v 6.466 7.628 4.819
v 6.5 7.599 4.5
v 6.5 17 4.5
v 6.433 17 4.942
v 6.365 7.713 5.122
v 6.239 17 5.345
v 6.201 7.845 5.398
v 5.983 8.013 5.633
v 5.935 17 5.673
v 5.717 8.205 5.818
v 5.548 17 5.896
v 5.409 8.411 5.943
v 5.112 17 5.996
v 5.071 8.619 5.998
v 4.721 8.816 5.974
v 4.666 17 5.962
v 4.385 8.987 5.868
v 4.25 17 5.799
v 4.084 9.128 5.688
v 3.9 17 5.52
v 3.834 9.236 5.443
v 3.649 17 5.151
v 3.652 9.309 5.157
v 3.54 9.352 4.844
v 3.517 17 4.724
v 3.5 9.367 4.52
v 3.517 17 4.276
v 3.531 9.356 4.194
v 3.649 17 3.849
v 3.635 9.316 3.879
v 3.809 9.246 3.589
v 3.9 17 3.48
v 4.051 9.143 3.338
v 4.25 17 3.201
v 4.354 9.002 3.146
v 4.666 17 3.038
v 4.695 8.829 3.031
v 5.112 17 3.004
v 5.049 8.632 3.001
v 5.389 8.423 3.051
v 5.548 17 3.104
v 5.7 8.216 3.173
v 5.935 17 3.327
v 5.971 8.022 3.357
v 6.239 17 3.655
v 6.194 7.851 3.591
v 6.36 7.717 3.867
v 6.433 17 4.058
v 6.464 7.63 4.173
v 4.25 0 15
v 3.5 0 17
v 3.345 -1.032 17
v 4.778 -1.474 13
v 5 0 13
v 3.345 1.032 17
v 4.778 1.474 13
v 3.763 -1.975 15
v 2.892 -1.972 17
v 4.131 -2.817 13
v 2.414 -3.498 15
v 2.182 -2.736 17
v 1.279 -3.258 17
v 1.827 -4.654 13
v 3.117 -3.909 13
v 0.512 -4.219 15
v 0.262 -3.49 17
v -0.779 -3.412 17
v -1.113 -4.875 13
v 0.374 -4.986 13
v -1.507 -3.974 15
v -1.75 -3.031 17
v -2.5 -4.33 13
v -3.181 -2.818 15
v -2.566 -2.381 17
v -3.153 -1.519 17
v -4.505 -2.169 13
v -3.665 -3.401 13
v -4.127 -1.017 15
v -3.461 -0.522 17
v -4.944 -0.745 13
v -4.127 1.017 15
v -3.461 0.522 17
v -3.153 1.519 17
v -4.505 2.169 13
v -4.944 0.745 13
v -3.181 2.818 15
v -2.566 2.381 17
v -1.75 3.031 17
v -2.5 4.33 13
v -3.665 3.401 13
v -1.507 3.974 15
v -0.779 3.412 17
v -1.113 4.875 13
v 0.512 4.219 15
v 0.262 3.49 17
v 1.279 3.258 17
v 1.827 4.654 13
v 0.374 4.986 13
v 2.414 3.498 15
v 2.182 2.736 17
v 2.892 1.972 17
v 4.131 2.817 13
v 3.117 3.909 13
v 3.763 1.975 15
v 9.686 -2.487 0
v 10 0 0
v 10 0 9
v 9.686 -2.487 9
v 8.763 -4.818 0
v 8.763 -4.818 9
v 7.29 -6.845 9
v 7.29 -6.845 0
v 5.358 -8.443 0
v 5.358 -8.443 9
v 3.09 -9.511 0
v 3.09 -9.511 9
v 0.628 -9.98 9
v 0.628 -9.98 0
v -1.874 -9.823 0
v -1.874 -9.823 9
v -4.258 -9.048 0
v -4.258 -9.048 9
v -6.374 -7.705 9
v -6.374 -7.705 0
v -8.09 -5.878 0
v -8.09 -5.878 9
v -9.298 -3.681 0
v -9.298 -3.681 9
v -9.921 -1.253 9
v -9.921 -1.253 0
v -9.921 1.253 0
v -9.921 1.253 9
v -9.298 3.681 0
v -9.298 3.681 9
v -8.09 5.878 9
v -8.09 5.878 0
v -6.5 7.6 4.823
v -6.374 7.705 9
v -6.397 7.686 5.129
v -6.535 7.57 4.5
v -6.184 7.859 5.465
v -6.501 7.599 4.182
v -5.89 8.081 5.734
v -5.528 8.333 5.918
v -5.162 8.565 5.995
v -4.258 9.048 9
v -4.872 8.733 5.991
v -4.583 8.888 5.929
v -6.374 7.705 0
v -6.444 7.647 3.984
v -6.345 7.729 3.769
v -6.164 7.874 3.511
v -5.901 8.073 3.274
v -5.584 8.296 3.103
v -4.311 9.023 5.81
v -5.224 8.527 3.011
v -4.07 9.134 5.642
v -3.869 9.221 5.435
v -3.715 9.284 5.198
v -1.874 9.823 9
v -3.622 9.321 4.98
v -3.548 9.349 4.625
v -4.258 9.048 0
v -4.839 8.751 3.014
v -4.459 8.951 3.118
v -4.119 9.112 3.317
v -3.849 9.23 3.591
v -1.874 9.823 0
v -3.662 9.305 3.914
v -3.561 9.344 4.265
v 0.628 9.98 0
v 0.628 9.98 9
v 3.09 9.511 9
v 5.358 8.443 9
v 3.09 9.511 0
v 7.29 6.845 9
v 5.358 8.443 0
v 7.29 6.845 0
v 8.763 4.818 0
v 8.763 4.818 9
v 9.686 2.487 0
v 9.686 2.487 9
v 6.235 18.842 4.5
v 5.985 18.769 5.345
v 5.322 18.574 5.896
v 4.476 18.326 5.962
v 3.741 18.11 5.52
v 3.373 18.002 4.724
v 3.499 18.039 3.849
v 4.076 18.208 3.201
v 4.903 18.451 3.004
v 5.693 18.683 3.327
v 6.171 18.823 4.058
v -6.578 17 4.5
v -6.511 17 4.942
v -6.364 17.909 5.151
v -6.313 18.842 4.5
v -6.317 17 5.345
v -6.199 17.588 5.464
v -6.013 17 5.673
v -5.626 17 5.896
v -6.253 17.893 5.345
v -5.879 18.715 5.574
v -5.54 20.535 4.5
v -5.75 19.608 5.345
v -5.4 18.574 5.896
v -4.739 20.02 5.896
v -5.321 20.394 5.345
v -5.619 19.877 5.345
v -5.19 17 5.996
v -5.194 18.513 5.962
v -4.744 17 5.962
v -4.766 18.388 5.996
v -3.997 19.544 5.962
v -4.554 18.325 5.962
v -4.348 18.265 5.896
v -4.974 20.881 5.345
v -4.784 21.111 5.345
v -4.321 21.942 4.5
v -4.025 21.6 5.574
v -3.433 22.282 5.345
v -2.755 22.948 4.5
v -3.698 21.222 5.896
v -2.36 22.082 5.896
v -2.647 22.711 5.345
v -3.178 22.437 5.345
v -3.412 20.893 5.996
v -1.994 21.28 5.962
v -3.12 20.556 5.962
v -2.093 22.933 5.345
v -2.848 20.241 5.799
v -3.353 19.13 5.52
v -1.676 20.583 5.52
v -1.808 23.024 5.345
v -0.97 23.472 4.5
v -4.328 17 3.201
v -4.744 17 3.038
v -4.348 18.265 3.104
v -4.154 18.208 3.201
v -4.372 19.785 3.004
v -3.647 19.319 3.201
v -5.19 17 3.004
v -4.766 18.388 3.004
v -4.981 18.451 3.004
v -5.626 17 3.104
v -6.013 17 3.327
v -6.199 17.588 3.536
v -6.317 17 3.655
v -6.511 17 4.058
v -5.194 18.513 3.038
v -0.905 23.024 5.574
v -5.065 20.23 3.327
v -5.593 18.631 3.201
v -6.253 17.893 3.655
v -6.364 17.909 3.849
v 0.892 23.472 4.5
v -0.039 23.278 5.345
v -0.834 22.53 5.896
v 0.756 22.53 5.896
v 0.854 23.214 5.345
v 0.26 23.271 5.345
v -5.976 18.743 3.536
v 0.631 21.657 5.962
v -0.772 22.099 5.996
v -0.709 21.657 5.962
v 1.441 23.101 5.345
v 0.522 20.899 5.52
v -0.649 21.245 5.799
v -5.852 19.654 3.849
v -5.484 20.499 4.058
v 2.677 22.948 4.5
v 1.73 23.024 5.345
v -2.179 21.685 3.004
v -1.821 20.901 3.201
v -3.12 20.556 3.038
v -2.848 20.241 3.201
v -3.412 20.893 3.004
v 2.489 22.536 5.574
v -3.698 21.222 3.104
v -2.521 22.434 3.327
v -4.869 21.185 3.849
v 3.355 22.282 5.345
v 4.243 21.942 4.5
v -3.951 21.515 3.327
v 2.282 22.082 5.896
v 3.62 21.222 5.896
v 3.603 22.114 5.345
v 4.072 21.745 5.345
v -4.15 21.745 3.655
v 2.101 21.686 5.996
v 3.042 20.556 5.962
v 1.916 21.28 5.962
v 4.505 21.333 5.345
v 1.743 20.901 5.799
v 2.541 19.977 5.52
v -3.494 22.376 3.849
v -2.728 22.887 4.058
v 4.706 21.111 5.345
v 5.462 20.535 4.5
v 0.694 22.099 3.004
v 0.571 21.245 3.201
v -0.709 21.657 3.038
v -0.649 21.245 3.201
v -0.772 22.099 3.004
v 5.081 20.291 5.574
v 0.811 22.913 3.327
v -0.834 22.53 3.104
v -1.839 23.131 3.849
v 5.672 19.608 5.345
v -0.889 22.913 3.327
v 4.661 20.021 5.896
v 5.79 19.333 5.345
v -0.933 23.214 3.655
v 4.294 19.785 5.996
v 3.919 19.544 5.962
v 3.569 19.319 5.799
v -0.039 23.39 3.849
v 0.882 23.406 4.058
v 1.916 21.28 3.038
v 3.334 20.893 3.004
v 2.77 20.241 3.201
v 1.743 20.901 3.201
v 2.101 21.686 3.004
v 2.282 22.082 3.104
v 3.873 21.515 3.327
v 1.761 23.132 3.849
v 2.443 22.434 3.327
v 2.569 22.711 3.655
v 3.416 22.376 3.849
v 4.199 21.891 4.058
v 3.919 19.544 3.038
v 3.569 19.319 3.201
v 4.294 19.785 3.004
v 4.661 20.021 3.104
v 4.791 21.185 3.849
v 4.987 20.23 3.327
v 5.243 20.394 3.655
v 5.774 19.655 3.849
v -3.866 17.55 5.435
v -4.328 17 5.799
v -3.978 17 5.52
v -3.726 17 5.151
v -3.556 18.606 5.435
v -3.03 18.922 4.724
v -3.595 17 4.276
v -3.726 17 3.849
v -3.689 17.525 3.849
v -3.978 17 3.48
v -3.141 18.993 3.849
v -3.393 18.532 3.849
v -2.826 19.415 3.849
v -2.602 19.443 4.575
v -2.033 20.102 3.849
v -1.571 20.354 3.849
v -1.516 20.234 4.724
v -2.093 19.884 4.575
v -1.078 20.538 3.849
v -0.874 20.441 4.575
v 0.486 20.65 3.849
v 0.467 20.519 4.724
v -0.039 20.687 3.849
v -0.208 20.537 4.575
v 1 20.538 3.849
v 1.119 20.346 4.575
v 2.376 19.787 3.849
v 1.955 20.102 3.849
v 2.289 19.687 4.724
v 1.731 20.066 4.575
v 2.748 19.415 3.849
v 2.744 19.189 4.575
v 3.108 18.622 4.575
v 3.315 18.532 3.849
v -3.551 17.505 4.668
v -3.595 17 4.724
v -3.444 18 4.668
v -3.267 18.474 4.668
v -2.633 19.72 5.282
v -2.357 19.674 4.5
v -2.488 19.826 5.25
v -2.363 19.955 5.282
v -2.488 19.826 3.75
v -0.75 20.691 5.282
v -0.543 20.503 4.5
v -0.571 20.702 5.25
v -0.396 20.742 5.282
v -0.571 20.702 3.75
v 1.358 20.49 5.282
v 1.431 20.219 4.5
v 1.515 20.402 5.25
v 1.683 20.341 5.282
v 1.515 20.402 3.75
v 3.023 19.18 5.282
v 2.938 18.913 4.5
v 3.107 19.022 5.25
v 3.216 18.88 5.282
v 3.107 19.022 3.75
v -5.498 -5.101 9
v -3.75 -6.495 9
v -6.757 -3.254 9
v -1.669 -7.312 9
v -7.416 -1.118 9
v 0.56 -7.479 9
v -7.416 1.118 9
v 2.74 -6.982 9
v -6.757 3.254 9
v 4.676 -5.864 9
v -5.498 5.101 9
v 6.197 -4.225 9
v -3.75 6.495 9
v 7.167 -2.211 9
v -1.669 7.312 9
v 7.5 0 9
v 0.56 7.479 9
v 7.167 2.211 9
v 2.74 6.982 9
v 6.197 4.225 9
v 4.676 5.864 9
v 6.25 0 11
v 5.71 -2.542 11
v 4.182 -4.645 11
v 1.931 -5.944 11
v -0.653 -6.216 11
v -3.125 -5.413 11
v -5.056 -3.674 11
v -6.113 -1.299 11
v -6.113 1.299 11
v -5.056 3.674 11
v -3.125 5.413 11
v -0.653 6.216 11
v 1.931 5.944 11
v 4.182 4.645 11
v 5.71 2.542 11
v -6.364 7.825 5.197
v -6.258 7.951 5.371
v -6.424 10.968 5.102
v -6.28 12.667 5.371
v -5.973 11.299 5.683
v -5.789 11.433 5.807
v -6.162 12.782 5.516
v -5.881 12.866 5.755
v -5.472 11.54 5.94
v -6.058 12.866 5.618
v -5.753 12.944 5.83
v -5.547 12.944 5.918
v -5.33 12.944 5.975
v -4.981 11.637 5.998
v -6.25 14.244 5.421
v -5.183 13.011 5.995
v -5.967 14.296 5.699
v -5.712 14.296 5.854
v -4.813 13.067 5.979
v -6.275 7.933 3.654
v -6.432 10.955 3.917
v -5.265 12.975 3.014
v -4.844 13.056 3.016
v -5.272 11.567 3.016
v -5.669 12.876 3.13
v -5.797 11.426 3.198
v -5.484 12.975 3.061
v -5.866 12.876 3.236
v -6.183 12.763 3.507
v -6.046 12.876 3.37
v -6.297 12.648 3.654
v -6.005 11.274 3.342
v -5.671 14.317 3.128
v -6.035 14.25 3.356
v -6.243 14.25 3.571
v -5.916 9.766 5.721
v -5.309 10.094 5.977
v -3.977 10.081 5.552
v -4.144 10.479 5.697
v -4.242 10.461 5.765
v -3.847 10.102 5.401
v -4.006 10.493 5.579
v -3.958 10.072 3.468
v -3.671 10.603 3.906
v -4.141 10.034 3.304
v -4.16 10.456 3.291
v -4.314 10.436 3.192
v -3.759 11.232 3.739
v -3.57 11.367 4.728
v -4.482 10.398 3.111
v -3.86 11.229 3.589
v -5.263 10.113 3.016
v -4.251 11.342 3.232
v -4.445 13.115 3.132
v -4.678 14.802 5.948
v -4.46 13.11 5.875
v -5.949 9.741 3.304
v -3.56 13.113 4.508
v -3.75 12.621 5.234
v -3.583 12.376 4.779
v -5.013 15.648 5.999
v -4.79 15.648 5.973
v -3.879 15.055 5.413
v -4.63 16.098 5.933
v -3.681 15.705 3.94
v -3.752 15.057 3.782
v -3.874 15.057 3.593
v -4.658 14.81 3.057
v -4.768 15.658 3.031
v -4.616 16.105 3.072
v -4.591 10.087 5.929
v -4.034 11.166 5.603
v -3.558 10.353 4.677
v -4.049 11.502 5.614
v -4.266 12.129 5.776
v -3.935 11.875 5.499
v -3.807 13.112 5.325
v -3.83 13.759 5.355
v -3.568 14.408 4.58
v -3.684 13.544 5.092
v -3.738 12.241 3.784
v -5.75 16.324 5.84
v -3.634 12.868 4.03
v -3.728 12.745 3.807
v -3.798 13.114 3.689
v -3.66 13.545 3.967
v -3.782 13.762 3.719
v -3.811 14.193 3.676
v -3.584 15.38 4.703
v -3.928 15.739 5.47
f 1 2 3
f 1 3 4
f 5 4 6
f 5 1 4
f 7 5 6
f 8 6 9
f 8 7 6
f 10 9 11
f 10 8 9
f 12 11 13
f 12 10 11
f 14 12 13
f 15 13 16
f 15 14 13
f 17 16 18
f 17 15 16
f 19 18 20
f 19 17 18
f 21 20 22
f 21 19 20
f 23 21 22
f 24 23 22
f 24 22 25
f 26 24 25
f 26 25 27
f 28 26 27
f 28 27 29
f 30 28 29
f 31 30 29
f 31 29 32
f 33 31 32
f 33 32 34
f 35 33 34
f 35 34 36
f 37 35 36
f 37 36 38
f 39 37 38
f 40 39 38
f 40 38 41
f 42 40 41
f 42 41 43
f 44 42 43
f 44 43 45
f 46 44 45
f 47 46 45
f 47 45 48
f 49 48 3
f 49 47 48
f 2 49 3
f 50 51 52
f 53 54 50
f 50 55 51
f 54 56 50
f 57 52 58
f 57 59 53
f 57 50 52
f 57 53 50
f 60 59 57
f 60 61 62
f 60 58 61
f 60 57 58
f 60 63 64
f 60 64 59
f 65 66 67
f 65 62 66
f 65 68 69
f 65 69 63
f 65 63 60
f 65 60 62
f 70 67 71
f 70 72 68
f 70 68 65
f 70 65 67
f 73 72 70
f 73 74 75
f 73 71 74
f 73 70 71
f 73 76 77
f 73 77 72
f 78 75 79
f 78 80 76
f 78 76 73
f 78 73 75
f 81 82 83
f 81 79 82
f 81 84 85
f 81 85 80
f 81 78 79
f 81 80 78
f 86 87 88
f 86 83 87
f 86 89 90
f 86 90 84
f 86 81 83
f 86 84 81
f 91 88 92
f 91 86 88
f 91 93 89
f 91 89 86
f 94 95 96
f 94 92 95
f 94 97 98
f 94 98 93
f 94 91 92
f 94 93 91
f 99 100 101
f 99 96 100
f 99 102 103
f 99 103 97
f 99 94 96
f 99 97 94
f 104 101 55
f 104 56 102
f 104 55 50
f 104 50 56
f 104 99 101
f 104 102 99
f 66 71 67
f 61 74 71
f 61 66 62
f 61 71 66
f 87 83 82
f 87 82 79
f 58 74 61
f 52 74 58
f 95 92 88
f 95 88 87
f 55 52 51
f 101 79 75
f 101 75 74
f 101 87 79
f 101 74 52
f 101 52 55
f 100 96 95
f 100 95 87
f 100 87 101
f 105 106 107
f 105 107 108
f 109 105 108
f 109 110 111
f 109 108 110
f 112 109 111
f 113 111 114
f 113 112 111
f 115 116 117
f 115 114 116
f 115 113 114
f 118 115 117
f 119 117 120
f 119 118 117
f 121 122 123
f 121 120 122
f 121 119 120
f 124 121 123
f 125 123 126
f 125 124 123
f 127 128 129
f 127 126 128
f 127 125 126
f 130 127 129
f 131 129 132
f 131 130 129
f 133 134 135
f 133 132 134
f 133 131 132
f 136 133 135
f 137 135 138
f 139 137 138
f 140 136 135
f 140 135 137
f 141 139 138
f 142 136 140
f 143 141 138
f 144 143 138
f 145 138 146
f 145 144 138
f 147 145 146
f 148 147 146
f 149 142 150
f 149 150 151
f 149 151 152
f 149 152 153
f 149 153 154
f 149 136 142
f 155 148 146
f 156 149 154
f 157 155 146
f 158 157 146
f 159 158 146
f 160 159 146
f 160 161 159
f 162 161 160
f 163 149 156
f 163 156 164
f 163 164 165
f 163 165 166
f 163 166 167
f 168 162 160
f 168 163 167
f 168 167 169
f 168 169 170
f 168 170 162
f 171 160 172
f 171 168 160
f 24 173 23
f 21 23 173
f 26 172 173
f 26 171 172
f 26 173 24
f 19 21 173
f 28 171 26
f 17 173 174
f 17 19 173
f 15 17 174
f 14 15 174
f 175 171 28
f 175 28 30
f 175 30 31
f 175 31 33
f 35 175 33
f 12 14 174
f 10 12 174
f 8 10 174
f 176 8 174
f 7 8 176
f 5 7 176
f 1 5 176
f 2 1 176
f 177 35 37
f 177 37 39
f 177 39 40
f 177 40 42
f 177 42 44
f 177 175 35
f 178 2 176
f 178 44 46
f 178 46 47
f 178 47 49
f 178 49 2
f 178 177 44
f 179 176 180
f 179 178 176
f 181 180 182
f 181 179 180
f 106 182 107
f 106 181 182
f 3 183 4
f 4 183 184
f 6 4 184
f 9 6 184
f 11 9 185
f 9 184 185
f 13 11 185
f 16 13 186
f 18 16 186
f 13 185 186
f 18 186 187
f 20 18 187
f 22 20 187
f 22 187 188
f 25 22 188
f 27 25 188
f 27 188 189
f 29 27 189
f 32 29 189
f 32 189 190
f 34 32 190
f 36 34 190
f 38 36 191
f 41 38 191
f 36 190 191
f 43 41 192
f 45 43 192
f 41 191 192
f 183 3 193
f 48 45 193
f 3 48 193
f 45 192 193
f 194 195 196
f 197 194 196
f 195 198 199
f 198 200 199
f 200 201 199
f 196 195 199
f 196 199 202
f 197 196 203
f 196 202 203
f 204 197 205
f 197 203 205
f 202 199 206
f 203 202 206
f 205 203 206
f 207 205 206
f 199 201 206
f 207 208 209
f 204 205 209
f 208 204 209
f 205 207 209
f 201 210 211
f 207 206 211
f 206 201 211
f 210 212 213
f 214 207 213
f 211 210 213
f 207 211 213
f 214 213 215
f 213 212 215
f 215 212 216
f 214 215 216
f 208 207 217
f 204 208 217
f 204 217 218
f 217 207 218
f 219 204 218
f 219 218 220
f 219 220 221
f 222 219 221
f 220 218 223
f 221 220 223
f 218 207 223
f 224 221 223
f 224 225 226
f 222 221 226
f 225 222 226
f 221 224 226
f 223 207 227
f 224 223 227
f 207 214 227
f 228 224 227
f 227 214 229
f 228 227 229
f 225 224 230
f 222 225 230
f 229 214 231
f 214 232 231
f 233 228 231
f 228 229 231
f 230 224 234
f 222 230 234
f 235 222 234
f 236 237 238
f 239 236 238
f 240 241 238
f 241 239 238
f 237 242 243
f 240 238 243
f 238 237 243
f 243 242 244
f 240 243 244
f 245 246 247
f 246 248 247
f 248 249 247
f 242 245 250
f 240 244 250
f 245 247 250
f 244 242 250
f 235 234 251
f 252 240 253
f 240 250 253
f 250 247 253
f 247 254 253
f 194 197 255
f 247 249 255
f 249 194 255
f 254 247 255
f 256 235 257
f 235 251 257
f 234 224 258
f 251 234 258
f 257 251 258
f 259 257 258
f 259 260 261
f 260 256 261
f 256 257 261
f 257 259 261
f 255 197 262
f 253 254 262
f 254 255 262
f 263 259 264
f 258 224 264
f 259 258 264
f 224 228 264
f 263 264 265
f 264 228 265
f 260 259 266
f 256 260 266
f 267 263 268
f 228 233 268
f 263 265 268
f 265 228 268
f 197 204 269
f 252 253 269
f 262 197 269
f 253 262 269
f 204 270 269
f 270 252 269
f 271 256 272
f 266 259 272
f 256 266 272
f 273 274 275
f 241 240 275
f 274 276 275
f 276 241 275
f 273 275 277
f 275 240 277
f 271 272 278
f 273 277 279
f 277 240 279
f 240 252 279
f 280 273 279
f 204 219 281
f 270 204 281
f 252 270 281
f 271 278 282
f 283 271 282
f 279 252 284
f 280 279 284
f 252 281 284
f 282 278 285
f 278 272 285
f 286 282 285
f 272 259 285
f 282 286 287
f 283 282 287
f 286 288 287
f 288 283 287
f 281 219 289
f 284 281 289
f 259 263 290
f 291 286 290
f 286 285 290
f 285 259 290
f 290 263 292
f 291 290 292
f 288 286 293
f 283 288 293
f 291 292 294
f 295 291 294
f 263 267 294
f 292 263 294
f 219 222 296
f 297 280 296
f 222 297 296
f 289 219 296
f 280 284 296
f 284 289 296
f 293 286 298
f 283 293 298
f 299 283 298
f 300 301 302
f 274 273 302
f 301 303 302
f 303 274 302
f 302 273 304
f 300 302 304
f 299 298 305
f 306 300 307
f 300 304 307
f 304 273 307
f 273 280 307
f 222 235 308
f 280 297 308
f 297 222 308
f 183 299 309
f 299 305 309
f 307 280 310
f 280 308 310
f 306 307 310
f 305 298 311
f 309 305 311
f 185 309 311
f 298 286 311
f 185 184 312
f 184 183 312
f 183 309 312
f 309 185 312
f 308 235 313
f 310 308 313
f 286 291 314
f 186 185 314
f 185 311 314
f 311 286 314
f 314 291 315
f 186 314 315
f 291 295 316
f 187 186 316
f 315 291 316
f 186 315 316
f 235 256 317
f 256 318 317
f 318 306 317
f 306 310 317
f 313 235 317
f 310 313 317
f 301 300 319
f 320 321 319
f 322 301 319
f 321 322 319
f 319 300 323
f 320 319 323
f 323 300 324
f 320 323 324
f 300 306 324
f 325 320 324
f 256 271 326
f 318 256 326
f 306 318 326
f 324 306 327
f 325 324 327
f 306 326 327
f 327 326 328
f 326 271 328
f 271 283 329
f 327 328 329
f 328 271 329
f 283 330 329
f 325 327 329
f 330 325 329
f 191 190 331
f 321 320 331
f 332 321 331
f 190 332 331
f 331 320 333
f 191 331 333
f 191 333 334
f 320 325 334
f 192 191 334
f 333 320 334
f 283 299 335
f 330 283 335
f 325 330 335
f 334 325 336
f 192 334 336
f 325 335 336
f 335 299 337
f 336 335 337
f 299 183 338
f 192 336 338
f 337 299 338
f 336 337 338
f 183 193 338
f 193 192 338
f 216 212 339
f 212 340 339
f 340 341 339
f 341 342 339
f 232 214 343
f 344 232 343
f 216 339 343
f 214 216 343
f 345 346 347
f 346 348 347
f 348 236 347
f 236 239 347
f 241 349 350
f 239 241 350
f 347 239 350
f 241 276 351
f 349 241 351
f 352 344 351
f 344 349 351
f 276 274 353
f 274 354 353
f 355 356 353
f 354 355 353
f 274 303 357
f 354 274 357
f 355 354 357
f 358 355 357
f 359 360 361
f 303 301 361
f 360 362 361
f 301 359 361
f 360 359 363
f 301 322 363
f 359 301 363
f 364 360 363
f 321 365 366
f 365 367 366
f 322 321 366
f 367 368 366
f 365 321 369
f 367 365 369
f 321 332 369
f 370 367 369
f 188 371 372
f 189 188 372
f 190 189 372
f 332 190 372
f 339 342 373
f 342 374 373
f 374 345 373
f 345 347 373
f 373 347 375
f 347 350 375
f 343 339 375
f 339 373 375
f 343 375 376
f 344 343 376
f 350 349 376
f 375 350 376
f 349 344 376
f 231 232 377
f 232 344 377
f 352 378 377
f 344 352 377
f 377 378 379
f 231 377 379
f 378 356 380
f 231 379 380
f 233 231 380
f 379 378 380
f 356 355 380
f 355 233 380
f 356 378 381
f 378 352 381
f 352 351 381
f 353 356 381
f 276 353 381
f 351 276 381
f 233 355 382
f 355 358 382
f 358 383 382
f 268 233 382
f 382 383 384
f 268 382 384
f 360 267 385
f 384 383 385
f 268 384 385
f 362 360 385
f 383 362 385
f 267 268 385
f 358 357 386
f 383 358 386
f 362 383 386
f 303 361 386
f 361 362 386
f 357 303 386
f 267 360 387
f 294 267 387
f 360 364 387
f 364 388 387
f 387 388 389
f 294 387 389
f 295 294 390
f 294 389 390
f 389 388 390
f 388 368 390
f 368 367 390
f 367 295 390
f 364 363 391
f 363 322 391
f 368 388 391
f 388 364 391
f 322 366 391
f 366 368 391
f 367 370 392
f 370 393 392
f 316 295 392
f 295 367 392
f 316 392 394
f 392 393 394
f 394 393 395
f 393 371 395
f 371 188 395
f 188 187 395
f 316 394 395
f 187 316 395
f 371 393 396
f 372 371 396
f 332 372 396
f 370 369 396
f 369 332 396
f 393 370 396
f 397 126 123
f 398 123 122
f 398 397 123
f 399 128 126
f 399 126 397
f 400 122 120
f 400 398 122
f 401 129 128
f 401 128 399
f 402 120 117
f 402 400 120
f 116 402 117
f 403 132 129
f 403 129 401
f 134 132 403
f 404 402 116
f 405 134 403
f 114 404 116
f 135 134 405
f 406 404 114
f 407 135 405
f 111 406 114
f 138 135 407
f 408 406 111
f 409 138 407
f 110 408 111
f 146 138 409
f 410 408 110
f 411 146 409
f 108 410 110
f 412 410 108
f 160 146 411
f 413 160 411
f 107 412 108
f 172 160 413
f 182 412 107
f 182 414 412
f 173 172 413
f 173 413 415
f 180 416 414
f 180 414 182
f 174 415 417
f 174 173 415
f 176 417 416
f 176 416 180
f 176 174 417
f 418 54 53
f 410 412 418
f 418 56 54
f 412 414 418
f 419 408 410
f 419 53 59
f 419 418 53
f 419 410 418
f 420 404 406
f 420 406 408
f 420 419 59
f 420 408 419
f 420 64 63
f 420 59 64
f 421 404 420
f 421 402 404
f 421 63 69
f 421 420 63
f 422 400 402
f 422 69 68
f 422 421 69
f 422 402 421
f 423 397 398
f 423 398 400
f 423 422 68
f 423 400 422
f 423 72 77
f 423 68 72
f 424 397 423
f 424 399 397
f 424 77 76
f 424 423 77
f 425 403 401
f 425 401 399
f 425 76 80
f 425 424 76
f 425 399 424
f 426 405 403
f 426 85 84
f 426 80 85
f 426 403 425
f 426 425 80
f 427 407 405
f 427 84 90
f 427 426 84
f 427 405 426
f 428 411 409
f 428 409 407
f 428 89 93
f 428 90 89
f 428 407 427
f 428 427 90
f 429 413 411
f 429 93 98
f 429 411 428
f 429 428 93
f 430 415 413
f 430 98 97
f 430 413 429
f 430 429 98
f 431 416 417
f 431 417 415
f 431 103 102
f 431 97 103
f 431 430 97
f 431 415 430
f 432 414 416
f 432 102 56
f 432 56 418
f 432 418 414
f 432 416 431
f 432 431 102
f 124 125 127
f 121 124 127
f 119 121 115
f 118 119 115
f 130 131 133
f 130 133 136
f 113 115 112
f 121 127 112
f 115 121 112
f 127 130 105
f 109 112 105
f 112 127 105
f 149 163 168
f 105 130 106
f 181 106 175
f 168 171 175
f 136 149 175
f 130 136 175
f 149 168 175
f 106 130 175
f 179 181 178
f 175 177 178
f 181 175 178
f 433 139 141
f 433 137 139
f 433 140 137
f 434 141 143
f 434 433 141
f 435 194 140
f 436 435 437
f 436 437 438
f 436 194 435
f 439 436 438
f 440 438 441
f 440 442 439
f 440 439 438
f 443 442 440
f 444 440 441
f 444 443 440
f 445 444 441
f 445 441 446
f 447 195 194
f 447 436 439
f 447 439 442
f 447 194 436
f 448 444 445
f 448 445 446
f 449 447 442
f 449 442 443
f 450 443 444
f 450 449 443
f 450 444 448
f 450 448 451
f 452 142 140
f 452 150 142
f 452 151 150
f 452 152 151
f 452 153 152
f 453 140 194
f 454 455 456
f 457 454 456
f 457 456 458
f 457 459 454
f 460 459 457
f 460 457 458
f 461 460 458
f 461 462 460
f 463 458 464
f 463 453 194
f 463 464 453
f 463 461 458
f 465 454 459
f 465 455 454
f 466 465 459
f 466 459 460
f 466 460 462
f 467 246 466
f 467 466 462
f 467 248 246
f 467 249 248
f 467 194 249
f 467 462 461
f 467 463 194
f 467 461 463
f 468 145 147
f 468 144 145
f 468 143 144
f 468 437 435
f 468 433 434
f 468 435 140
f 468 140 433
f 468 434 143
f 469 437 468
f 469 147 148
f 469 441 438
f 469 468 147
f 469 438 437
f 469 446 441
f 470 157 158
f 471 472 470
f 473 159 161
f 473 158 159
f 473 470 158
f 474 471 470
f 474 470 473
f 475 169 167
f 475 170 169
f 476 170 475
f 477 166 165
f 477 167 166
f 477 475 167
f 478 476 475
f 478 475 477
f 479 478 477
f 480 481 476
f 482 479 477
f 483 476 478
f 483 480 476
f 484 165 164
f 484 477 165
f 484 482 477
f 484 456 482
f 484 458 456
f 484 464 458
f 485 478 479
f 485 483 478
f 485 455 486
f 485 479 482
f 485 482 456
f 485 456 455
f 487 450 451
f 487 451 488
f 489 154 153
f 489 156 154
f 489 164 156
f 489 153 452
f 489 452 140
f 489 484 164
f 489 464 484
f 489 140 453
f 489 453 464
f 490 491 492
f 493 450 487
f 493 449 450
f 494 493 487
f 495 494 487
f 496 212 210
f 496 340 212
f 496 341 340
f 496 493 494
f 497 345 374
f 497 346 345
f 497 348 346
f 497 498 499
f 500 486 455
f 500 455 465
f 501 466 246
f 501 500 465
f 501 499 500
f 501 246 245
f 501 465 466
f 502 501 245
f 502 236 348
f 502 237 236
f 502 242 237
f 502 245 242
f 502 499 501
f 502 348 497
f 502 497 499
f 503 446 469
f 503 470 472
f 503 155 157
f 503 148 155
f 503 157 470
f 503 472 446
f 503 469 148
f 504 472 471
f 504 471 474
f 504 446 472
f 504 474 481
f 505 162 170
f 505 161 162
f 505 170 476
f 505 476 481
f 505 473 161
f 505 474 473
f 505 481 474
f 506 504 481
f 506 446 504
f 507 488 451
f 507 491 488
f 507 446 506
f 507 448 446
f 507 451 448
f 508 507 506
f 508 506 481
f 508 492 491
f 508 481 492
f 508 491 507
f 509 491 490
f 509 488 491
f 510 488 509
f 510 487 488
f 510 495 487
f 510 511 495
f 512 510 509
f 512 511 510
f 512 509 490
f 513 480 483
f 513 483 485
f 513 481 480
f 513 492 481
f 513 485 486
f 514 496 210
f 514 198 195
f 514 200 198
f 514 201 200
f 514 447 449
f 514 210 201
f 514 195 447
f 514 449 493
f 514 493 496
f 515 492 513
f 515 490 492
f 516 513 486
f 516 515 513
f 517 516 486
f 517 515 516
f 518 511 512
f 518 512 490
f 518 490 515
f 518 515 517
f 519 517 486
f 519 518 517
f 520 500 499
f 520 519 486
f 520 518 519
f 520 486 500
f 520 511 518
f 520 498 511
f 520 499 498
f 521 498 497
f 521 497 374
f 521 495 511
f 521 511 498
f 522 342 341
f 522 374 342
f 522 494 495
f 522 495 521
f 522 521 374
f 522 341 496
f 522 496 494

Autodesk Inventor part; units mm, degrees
sketch "Sketch1" plane through (0, 0, 0) normal (0, 0, 1) x (1, 0, 0)
  circle A0 centre (0, 0) radius 10
  dimension "d0" = 20
extrude "Extrusion1" add sketch "Sketch1" along normal blind 9
sketch "Sketch2" plane through (0, 0, 9) normal (0, 0, 1) x (1, 0, 0)
  circle A0 centre (0, 0) radius 7.5
  dimension "d3" = 15
ref_plane "Work Plane1" through (0, 0, 13) normal (0, 0, 1) x (1, 0, 0)
sketch "Sketch3" plane through (0, 0, 13) normal (0, 0, 1) x (1, 0, 0)
  circle A0 centre (0, 0) radius 5
  dimension "d5" = 10
loft "Loft1" add profiles "Sketch2", "Sketch3"
sketch "Sketch4" plane through (0, 0, 13) normal (0, 0, 1) x (1, 0, 0)
  circle A0 centre (0, 0) radius 5
  dimension "d10" = 10
ref_plane "Work Plane2" through (0, 0, 17) normal (0, 0, 1) x (1, 0, 0)
sketch "Sketch5" plane through (0, 0, 17) normal (0, 0, 1) x (1, 0, 0)
  circle A0 centre (0, 0) radius 3.5
  dimension "d12" = 7
loft "Loft2" add profiles "Sketch5" section 1 edges at (-5, 0, 13)
ref_plane "Work Plane3" through (0, 0, 4.5) normal (0, 0, 1) x (1, 0, 0)
sketch "Sketch6" plane through (0, 0, 4.5) normal (0, 0, 1) x (1, 0, 0)
  arc A0 (5, 17) -> (-5.0779, 16.9998) centre (-0.0389, 17) ccw
  line L0 (5, 17) -> (5, 0)
  circle A1 centre (0, 0) radius 5 projected
  line L1 (5, 17) -> (22, 17) construction
  line L2 (-5.0779, 16.9998) -> (-5, 0)
  line L3 (0, 0) -> (0, 5)
  dimension "d20" = 17
  dimension "d21" = 90
  dimension "d22" = 17
ref_plane "Work Plane4" through (5, 0, 4.5) normal (0, -1, 0) x (1, 0, 0)
sketch "Sketch7" plane through (5, 0, 4.5) normal (0, -1, 0) x (1, 0, 0)
  circle A0 centre (0, 0) radius 1.5
  point P0 (-5, -4.5)
  dimension "d23" = 3
sweep "Sweep1" add profiles "Sketch7" path "Sketch6" path curves L0 A0 L2
properties part number "padlock"
